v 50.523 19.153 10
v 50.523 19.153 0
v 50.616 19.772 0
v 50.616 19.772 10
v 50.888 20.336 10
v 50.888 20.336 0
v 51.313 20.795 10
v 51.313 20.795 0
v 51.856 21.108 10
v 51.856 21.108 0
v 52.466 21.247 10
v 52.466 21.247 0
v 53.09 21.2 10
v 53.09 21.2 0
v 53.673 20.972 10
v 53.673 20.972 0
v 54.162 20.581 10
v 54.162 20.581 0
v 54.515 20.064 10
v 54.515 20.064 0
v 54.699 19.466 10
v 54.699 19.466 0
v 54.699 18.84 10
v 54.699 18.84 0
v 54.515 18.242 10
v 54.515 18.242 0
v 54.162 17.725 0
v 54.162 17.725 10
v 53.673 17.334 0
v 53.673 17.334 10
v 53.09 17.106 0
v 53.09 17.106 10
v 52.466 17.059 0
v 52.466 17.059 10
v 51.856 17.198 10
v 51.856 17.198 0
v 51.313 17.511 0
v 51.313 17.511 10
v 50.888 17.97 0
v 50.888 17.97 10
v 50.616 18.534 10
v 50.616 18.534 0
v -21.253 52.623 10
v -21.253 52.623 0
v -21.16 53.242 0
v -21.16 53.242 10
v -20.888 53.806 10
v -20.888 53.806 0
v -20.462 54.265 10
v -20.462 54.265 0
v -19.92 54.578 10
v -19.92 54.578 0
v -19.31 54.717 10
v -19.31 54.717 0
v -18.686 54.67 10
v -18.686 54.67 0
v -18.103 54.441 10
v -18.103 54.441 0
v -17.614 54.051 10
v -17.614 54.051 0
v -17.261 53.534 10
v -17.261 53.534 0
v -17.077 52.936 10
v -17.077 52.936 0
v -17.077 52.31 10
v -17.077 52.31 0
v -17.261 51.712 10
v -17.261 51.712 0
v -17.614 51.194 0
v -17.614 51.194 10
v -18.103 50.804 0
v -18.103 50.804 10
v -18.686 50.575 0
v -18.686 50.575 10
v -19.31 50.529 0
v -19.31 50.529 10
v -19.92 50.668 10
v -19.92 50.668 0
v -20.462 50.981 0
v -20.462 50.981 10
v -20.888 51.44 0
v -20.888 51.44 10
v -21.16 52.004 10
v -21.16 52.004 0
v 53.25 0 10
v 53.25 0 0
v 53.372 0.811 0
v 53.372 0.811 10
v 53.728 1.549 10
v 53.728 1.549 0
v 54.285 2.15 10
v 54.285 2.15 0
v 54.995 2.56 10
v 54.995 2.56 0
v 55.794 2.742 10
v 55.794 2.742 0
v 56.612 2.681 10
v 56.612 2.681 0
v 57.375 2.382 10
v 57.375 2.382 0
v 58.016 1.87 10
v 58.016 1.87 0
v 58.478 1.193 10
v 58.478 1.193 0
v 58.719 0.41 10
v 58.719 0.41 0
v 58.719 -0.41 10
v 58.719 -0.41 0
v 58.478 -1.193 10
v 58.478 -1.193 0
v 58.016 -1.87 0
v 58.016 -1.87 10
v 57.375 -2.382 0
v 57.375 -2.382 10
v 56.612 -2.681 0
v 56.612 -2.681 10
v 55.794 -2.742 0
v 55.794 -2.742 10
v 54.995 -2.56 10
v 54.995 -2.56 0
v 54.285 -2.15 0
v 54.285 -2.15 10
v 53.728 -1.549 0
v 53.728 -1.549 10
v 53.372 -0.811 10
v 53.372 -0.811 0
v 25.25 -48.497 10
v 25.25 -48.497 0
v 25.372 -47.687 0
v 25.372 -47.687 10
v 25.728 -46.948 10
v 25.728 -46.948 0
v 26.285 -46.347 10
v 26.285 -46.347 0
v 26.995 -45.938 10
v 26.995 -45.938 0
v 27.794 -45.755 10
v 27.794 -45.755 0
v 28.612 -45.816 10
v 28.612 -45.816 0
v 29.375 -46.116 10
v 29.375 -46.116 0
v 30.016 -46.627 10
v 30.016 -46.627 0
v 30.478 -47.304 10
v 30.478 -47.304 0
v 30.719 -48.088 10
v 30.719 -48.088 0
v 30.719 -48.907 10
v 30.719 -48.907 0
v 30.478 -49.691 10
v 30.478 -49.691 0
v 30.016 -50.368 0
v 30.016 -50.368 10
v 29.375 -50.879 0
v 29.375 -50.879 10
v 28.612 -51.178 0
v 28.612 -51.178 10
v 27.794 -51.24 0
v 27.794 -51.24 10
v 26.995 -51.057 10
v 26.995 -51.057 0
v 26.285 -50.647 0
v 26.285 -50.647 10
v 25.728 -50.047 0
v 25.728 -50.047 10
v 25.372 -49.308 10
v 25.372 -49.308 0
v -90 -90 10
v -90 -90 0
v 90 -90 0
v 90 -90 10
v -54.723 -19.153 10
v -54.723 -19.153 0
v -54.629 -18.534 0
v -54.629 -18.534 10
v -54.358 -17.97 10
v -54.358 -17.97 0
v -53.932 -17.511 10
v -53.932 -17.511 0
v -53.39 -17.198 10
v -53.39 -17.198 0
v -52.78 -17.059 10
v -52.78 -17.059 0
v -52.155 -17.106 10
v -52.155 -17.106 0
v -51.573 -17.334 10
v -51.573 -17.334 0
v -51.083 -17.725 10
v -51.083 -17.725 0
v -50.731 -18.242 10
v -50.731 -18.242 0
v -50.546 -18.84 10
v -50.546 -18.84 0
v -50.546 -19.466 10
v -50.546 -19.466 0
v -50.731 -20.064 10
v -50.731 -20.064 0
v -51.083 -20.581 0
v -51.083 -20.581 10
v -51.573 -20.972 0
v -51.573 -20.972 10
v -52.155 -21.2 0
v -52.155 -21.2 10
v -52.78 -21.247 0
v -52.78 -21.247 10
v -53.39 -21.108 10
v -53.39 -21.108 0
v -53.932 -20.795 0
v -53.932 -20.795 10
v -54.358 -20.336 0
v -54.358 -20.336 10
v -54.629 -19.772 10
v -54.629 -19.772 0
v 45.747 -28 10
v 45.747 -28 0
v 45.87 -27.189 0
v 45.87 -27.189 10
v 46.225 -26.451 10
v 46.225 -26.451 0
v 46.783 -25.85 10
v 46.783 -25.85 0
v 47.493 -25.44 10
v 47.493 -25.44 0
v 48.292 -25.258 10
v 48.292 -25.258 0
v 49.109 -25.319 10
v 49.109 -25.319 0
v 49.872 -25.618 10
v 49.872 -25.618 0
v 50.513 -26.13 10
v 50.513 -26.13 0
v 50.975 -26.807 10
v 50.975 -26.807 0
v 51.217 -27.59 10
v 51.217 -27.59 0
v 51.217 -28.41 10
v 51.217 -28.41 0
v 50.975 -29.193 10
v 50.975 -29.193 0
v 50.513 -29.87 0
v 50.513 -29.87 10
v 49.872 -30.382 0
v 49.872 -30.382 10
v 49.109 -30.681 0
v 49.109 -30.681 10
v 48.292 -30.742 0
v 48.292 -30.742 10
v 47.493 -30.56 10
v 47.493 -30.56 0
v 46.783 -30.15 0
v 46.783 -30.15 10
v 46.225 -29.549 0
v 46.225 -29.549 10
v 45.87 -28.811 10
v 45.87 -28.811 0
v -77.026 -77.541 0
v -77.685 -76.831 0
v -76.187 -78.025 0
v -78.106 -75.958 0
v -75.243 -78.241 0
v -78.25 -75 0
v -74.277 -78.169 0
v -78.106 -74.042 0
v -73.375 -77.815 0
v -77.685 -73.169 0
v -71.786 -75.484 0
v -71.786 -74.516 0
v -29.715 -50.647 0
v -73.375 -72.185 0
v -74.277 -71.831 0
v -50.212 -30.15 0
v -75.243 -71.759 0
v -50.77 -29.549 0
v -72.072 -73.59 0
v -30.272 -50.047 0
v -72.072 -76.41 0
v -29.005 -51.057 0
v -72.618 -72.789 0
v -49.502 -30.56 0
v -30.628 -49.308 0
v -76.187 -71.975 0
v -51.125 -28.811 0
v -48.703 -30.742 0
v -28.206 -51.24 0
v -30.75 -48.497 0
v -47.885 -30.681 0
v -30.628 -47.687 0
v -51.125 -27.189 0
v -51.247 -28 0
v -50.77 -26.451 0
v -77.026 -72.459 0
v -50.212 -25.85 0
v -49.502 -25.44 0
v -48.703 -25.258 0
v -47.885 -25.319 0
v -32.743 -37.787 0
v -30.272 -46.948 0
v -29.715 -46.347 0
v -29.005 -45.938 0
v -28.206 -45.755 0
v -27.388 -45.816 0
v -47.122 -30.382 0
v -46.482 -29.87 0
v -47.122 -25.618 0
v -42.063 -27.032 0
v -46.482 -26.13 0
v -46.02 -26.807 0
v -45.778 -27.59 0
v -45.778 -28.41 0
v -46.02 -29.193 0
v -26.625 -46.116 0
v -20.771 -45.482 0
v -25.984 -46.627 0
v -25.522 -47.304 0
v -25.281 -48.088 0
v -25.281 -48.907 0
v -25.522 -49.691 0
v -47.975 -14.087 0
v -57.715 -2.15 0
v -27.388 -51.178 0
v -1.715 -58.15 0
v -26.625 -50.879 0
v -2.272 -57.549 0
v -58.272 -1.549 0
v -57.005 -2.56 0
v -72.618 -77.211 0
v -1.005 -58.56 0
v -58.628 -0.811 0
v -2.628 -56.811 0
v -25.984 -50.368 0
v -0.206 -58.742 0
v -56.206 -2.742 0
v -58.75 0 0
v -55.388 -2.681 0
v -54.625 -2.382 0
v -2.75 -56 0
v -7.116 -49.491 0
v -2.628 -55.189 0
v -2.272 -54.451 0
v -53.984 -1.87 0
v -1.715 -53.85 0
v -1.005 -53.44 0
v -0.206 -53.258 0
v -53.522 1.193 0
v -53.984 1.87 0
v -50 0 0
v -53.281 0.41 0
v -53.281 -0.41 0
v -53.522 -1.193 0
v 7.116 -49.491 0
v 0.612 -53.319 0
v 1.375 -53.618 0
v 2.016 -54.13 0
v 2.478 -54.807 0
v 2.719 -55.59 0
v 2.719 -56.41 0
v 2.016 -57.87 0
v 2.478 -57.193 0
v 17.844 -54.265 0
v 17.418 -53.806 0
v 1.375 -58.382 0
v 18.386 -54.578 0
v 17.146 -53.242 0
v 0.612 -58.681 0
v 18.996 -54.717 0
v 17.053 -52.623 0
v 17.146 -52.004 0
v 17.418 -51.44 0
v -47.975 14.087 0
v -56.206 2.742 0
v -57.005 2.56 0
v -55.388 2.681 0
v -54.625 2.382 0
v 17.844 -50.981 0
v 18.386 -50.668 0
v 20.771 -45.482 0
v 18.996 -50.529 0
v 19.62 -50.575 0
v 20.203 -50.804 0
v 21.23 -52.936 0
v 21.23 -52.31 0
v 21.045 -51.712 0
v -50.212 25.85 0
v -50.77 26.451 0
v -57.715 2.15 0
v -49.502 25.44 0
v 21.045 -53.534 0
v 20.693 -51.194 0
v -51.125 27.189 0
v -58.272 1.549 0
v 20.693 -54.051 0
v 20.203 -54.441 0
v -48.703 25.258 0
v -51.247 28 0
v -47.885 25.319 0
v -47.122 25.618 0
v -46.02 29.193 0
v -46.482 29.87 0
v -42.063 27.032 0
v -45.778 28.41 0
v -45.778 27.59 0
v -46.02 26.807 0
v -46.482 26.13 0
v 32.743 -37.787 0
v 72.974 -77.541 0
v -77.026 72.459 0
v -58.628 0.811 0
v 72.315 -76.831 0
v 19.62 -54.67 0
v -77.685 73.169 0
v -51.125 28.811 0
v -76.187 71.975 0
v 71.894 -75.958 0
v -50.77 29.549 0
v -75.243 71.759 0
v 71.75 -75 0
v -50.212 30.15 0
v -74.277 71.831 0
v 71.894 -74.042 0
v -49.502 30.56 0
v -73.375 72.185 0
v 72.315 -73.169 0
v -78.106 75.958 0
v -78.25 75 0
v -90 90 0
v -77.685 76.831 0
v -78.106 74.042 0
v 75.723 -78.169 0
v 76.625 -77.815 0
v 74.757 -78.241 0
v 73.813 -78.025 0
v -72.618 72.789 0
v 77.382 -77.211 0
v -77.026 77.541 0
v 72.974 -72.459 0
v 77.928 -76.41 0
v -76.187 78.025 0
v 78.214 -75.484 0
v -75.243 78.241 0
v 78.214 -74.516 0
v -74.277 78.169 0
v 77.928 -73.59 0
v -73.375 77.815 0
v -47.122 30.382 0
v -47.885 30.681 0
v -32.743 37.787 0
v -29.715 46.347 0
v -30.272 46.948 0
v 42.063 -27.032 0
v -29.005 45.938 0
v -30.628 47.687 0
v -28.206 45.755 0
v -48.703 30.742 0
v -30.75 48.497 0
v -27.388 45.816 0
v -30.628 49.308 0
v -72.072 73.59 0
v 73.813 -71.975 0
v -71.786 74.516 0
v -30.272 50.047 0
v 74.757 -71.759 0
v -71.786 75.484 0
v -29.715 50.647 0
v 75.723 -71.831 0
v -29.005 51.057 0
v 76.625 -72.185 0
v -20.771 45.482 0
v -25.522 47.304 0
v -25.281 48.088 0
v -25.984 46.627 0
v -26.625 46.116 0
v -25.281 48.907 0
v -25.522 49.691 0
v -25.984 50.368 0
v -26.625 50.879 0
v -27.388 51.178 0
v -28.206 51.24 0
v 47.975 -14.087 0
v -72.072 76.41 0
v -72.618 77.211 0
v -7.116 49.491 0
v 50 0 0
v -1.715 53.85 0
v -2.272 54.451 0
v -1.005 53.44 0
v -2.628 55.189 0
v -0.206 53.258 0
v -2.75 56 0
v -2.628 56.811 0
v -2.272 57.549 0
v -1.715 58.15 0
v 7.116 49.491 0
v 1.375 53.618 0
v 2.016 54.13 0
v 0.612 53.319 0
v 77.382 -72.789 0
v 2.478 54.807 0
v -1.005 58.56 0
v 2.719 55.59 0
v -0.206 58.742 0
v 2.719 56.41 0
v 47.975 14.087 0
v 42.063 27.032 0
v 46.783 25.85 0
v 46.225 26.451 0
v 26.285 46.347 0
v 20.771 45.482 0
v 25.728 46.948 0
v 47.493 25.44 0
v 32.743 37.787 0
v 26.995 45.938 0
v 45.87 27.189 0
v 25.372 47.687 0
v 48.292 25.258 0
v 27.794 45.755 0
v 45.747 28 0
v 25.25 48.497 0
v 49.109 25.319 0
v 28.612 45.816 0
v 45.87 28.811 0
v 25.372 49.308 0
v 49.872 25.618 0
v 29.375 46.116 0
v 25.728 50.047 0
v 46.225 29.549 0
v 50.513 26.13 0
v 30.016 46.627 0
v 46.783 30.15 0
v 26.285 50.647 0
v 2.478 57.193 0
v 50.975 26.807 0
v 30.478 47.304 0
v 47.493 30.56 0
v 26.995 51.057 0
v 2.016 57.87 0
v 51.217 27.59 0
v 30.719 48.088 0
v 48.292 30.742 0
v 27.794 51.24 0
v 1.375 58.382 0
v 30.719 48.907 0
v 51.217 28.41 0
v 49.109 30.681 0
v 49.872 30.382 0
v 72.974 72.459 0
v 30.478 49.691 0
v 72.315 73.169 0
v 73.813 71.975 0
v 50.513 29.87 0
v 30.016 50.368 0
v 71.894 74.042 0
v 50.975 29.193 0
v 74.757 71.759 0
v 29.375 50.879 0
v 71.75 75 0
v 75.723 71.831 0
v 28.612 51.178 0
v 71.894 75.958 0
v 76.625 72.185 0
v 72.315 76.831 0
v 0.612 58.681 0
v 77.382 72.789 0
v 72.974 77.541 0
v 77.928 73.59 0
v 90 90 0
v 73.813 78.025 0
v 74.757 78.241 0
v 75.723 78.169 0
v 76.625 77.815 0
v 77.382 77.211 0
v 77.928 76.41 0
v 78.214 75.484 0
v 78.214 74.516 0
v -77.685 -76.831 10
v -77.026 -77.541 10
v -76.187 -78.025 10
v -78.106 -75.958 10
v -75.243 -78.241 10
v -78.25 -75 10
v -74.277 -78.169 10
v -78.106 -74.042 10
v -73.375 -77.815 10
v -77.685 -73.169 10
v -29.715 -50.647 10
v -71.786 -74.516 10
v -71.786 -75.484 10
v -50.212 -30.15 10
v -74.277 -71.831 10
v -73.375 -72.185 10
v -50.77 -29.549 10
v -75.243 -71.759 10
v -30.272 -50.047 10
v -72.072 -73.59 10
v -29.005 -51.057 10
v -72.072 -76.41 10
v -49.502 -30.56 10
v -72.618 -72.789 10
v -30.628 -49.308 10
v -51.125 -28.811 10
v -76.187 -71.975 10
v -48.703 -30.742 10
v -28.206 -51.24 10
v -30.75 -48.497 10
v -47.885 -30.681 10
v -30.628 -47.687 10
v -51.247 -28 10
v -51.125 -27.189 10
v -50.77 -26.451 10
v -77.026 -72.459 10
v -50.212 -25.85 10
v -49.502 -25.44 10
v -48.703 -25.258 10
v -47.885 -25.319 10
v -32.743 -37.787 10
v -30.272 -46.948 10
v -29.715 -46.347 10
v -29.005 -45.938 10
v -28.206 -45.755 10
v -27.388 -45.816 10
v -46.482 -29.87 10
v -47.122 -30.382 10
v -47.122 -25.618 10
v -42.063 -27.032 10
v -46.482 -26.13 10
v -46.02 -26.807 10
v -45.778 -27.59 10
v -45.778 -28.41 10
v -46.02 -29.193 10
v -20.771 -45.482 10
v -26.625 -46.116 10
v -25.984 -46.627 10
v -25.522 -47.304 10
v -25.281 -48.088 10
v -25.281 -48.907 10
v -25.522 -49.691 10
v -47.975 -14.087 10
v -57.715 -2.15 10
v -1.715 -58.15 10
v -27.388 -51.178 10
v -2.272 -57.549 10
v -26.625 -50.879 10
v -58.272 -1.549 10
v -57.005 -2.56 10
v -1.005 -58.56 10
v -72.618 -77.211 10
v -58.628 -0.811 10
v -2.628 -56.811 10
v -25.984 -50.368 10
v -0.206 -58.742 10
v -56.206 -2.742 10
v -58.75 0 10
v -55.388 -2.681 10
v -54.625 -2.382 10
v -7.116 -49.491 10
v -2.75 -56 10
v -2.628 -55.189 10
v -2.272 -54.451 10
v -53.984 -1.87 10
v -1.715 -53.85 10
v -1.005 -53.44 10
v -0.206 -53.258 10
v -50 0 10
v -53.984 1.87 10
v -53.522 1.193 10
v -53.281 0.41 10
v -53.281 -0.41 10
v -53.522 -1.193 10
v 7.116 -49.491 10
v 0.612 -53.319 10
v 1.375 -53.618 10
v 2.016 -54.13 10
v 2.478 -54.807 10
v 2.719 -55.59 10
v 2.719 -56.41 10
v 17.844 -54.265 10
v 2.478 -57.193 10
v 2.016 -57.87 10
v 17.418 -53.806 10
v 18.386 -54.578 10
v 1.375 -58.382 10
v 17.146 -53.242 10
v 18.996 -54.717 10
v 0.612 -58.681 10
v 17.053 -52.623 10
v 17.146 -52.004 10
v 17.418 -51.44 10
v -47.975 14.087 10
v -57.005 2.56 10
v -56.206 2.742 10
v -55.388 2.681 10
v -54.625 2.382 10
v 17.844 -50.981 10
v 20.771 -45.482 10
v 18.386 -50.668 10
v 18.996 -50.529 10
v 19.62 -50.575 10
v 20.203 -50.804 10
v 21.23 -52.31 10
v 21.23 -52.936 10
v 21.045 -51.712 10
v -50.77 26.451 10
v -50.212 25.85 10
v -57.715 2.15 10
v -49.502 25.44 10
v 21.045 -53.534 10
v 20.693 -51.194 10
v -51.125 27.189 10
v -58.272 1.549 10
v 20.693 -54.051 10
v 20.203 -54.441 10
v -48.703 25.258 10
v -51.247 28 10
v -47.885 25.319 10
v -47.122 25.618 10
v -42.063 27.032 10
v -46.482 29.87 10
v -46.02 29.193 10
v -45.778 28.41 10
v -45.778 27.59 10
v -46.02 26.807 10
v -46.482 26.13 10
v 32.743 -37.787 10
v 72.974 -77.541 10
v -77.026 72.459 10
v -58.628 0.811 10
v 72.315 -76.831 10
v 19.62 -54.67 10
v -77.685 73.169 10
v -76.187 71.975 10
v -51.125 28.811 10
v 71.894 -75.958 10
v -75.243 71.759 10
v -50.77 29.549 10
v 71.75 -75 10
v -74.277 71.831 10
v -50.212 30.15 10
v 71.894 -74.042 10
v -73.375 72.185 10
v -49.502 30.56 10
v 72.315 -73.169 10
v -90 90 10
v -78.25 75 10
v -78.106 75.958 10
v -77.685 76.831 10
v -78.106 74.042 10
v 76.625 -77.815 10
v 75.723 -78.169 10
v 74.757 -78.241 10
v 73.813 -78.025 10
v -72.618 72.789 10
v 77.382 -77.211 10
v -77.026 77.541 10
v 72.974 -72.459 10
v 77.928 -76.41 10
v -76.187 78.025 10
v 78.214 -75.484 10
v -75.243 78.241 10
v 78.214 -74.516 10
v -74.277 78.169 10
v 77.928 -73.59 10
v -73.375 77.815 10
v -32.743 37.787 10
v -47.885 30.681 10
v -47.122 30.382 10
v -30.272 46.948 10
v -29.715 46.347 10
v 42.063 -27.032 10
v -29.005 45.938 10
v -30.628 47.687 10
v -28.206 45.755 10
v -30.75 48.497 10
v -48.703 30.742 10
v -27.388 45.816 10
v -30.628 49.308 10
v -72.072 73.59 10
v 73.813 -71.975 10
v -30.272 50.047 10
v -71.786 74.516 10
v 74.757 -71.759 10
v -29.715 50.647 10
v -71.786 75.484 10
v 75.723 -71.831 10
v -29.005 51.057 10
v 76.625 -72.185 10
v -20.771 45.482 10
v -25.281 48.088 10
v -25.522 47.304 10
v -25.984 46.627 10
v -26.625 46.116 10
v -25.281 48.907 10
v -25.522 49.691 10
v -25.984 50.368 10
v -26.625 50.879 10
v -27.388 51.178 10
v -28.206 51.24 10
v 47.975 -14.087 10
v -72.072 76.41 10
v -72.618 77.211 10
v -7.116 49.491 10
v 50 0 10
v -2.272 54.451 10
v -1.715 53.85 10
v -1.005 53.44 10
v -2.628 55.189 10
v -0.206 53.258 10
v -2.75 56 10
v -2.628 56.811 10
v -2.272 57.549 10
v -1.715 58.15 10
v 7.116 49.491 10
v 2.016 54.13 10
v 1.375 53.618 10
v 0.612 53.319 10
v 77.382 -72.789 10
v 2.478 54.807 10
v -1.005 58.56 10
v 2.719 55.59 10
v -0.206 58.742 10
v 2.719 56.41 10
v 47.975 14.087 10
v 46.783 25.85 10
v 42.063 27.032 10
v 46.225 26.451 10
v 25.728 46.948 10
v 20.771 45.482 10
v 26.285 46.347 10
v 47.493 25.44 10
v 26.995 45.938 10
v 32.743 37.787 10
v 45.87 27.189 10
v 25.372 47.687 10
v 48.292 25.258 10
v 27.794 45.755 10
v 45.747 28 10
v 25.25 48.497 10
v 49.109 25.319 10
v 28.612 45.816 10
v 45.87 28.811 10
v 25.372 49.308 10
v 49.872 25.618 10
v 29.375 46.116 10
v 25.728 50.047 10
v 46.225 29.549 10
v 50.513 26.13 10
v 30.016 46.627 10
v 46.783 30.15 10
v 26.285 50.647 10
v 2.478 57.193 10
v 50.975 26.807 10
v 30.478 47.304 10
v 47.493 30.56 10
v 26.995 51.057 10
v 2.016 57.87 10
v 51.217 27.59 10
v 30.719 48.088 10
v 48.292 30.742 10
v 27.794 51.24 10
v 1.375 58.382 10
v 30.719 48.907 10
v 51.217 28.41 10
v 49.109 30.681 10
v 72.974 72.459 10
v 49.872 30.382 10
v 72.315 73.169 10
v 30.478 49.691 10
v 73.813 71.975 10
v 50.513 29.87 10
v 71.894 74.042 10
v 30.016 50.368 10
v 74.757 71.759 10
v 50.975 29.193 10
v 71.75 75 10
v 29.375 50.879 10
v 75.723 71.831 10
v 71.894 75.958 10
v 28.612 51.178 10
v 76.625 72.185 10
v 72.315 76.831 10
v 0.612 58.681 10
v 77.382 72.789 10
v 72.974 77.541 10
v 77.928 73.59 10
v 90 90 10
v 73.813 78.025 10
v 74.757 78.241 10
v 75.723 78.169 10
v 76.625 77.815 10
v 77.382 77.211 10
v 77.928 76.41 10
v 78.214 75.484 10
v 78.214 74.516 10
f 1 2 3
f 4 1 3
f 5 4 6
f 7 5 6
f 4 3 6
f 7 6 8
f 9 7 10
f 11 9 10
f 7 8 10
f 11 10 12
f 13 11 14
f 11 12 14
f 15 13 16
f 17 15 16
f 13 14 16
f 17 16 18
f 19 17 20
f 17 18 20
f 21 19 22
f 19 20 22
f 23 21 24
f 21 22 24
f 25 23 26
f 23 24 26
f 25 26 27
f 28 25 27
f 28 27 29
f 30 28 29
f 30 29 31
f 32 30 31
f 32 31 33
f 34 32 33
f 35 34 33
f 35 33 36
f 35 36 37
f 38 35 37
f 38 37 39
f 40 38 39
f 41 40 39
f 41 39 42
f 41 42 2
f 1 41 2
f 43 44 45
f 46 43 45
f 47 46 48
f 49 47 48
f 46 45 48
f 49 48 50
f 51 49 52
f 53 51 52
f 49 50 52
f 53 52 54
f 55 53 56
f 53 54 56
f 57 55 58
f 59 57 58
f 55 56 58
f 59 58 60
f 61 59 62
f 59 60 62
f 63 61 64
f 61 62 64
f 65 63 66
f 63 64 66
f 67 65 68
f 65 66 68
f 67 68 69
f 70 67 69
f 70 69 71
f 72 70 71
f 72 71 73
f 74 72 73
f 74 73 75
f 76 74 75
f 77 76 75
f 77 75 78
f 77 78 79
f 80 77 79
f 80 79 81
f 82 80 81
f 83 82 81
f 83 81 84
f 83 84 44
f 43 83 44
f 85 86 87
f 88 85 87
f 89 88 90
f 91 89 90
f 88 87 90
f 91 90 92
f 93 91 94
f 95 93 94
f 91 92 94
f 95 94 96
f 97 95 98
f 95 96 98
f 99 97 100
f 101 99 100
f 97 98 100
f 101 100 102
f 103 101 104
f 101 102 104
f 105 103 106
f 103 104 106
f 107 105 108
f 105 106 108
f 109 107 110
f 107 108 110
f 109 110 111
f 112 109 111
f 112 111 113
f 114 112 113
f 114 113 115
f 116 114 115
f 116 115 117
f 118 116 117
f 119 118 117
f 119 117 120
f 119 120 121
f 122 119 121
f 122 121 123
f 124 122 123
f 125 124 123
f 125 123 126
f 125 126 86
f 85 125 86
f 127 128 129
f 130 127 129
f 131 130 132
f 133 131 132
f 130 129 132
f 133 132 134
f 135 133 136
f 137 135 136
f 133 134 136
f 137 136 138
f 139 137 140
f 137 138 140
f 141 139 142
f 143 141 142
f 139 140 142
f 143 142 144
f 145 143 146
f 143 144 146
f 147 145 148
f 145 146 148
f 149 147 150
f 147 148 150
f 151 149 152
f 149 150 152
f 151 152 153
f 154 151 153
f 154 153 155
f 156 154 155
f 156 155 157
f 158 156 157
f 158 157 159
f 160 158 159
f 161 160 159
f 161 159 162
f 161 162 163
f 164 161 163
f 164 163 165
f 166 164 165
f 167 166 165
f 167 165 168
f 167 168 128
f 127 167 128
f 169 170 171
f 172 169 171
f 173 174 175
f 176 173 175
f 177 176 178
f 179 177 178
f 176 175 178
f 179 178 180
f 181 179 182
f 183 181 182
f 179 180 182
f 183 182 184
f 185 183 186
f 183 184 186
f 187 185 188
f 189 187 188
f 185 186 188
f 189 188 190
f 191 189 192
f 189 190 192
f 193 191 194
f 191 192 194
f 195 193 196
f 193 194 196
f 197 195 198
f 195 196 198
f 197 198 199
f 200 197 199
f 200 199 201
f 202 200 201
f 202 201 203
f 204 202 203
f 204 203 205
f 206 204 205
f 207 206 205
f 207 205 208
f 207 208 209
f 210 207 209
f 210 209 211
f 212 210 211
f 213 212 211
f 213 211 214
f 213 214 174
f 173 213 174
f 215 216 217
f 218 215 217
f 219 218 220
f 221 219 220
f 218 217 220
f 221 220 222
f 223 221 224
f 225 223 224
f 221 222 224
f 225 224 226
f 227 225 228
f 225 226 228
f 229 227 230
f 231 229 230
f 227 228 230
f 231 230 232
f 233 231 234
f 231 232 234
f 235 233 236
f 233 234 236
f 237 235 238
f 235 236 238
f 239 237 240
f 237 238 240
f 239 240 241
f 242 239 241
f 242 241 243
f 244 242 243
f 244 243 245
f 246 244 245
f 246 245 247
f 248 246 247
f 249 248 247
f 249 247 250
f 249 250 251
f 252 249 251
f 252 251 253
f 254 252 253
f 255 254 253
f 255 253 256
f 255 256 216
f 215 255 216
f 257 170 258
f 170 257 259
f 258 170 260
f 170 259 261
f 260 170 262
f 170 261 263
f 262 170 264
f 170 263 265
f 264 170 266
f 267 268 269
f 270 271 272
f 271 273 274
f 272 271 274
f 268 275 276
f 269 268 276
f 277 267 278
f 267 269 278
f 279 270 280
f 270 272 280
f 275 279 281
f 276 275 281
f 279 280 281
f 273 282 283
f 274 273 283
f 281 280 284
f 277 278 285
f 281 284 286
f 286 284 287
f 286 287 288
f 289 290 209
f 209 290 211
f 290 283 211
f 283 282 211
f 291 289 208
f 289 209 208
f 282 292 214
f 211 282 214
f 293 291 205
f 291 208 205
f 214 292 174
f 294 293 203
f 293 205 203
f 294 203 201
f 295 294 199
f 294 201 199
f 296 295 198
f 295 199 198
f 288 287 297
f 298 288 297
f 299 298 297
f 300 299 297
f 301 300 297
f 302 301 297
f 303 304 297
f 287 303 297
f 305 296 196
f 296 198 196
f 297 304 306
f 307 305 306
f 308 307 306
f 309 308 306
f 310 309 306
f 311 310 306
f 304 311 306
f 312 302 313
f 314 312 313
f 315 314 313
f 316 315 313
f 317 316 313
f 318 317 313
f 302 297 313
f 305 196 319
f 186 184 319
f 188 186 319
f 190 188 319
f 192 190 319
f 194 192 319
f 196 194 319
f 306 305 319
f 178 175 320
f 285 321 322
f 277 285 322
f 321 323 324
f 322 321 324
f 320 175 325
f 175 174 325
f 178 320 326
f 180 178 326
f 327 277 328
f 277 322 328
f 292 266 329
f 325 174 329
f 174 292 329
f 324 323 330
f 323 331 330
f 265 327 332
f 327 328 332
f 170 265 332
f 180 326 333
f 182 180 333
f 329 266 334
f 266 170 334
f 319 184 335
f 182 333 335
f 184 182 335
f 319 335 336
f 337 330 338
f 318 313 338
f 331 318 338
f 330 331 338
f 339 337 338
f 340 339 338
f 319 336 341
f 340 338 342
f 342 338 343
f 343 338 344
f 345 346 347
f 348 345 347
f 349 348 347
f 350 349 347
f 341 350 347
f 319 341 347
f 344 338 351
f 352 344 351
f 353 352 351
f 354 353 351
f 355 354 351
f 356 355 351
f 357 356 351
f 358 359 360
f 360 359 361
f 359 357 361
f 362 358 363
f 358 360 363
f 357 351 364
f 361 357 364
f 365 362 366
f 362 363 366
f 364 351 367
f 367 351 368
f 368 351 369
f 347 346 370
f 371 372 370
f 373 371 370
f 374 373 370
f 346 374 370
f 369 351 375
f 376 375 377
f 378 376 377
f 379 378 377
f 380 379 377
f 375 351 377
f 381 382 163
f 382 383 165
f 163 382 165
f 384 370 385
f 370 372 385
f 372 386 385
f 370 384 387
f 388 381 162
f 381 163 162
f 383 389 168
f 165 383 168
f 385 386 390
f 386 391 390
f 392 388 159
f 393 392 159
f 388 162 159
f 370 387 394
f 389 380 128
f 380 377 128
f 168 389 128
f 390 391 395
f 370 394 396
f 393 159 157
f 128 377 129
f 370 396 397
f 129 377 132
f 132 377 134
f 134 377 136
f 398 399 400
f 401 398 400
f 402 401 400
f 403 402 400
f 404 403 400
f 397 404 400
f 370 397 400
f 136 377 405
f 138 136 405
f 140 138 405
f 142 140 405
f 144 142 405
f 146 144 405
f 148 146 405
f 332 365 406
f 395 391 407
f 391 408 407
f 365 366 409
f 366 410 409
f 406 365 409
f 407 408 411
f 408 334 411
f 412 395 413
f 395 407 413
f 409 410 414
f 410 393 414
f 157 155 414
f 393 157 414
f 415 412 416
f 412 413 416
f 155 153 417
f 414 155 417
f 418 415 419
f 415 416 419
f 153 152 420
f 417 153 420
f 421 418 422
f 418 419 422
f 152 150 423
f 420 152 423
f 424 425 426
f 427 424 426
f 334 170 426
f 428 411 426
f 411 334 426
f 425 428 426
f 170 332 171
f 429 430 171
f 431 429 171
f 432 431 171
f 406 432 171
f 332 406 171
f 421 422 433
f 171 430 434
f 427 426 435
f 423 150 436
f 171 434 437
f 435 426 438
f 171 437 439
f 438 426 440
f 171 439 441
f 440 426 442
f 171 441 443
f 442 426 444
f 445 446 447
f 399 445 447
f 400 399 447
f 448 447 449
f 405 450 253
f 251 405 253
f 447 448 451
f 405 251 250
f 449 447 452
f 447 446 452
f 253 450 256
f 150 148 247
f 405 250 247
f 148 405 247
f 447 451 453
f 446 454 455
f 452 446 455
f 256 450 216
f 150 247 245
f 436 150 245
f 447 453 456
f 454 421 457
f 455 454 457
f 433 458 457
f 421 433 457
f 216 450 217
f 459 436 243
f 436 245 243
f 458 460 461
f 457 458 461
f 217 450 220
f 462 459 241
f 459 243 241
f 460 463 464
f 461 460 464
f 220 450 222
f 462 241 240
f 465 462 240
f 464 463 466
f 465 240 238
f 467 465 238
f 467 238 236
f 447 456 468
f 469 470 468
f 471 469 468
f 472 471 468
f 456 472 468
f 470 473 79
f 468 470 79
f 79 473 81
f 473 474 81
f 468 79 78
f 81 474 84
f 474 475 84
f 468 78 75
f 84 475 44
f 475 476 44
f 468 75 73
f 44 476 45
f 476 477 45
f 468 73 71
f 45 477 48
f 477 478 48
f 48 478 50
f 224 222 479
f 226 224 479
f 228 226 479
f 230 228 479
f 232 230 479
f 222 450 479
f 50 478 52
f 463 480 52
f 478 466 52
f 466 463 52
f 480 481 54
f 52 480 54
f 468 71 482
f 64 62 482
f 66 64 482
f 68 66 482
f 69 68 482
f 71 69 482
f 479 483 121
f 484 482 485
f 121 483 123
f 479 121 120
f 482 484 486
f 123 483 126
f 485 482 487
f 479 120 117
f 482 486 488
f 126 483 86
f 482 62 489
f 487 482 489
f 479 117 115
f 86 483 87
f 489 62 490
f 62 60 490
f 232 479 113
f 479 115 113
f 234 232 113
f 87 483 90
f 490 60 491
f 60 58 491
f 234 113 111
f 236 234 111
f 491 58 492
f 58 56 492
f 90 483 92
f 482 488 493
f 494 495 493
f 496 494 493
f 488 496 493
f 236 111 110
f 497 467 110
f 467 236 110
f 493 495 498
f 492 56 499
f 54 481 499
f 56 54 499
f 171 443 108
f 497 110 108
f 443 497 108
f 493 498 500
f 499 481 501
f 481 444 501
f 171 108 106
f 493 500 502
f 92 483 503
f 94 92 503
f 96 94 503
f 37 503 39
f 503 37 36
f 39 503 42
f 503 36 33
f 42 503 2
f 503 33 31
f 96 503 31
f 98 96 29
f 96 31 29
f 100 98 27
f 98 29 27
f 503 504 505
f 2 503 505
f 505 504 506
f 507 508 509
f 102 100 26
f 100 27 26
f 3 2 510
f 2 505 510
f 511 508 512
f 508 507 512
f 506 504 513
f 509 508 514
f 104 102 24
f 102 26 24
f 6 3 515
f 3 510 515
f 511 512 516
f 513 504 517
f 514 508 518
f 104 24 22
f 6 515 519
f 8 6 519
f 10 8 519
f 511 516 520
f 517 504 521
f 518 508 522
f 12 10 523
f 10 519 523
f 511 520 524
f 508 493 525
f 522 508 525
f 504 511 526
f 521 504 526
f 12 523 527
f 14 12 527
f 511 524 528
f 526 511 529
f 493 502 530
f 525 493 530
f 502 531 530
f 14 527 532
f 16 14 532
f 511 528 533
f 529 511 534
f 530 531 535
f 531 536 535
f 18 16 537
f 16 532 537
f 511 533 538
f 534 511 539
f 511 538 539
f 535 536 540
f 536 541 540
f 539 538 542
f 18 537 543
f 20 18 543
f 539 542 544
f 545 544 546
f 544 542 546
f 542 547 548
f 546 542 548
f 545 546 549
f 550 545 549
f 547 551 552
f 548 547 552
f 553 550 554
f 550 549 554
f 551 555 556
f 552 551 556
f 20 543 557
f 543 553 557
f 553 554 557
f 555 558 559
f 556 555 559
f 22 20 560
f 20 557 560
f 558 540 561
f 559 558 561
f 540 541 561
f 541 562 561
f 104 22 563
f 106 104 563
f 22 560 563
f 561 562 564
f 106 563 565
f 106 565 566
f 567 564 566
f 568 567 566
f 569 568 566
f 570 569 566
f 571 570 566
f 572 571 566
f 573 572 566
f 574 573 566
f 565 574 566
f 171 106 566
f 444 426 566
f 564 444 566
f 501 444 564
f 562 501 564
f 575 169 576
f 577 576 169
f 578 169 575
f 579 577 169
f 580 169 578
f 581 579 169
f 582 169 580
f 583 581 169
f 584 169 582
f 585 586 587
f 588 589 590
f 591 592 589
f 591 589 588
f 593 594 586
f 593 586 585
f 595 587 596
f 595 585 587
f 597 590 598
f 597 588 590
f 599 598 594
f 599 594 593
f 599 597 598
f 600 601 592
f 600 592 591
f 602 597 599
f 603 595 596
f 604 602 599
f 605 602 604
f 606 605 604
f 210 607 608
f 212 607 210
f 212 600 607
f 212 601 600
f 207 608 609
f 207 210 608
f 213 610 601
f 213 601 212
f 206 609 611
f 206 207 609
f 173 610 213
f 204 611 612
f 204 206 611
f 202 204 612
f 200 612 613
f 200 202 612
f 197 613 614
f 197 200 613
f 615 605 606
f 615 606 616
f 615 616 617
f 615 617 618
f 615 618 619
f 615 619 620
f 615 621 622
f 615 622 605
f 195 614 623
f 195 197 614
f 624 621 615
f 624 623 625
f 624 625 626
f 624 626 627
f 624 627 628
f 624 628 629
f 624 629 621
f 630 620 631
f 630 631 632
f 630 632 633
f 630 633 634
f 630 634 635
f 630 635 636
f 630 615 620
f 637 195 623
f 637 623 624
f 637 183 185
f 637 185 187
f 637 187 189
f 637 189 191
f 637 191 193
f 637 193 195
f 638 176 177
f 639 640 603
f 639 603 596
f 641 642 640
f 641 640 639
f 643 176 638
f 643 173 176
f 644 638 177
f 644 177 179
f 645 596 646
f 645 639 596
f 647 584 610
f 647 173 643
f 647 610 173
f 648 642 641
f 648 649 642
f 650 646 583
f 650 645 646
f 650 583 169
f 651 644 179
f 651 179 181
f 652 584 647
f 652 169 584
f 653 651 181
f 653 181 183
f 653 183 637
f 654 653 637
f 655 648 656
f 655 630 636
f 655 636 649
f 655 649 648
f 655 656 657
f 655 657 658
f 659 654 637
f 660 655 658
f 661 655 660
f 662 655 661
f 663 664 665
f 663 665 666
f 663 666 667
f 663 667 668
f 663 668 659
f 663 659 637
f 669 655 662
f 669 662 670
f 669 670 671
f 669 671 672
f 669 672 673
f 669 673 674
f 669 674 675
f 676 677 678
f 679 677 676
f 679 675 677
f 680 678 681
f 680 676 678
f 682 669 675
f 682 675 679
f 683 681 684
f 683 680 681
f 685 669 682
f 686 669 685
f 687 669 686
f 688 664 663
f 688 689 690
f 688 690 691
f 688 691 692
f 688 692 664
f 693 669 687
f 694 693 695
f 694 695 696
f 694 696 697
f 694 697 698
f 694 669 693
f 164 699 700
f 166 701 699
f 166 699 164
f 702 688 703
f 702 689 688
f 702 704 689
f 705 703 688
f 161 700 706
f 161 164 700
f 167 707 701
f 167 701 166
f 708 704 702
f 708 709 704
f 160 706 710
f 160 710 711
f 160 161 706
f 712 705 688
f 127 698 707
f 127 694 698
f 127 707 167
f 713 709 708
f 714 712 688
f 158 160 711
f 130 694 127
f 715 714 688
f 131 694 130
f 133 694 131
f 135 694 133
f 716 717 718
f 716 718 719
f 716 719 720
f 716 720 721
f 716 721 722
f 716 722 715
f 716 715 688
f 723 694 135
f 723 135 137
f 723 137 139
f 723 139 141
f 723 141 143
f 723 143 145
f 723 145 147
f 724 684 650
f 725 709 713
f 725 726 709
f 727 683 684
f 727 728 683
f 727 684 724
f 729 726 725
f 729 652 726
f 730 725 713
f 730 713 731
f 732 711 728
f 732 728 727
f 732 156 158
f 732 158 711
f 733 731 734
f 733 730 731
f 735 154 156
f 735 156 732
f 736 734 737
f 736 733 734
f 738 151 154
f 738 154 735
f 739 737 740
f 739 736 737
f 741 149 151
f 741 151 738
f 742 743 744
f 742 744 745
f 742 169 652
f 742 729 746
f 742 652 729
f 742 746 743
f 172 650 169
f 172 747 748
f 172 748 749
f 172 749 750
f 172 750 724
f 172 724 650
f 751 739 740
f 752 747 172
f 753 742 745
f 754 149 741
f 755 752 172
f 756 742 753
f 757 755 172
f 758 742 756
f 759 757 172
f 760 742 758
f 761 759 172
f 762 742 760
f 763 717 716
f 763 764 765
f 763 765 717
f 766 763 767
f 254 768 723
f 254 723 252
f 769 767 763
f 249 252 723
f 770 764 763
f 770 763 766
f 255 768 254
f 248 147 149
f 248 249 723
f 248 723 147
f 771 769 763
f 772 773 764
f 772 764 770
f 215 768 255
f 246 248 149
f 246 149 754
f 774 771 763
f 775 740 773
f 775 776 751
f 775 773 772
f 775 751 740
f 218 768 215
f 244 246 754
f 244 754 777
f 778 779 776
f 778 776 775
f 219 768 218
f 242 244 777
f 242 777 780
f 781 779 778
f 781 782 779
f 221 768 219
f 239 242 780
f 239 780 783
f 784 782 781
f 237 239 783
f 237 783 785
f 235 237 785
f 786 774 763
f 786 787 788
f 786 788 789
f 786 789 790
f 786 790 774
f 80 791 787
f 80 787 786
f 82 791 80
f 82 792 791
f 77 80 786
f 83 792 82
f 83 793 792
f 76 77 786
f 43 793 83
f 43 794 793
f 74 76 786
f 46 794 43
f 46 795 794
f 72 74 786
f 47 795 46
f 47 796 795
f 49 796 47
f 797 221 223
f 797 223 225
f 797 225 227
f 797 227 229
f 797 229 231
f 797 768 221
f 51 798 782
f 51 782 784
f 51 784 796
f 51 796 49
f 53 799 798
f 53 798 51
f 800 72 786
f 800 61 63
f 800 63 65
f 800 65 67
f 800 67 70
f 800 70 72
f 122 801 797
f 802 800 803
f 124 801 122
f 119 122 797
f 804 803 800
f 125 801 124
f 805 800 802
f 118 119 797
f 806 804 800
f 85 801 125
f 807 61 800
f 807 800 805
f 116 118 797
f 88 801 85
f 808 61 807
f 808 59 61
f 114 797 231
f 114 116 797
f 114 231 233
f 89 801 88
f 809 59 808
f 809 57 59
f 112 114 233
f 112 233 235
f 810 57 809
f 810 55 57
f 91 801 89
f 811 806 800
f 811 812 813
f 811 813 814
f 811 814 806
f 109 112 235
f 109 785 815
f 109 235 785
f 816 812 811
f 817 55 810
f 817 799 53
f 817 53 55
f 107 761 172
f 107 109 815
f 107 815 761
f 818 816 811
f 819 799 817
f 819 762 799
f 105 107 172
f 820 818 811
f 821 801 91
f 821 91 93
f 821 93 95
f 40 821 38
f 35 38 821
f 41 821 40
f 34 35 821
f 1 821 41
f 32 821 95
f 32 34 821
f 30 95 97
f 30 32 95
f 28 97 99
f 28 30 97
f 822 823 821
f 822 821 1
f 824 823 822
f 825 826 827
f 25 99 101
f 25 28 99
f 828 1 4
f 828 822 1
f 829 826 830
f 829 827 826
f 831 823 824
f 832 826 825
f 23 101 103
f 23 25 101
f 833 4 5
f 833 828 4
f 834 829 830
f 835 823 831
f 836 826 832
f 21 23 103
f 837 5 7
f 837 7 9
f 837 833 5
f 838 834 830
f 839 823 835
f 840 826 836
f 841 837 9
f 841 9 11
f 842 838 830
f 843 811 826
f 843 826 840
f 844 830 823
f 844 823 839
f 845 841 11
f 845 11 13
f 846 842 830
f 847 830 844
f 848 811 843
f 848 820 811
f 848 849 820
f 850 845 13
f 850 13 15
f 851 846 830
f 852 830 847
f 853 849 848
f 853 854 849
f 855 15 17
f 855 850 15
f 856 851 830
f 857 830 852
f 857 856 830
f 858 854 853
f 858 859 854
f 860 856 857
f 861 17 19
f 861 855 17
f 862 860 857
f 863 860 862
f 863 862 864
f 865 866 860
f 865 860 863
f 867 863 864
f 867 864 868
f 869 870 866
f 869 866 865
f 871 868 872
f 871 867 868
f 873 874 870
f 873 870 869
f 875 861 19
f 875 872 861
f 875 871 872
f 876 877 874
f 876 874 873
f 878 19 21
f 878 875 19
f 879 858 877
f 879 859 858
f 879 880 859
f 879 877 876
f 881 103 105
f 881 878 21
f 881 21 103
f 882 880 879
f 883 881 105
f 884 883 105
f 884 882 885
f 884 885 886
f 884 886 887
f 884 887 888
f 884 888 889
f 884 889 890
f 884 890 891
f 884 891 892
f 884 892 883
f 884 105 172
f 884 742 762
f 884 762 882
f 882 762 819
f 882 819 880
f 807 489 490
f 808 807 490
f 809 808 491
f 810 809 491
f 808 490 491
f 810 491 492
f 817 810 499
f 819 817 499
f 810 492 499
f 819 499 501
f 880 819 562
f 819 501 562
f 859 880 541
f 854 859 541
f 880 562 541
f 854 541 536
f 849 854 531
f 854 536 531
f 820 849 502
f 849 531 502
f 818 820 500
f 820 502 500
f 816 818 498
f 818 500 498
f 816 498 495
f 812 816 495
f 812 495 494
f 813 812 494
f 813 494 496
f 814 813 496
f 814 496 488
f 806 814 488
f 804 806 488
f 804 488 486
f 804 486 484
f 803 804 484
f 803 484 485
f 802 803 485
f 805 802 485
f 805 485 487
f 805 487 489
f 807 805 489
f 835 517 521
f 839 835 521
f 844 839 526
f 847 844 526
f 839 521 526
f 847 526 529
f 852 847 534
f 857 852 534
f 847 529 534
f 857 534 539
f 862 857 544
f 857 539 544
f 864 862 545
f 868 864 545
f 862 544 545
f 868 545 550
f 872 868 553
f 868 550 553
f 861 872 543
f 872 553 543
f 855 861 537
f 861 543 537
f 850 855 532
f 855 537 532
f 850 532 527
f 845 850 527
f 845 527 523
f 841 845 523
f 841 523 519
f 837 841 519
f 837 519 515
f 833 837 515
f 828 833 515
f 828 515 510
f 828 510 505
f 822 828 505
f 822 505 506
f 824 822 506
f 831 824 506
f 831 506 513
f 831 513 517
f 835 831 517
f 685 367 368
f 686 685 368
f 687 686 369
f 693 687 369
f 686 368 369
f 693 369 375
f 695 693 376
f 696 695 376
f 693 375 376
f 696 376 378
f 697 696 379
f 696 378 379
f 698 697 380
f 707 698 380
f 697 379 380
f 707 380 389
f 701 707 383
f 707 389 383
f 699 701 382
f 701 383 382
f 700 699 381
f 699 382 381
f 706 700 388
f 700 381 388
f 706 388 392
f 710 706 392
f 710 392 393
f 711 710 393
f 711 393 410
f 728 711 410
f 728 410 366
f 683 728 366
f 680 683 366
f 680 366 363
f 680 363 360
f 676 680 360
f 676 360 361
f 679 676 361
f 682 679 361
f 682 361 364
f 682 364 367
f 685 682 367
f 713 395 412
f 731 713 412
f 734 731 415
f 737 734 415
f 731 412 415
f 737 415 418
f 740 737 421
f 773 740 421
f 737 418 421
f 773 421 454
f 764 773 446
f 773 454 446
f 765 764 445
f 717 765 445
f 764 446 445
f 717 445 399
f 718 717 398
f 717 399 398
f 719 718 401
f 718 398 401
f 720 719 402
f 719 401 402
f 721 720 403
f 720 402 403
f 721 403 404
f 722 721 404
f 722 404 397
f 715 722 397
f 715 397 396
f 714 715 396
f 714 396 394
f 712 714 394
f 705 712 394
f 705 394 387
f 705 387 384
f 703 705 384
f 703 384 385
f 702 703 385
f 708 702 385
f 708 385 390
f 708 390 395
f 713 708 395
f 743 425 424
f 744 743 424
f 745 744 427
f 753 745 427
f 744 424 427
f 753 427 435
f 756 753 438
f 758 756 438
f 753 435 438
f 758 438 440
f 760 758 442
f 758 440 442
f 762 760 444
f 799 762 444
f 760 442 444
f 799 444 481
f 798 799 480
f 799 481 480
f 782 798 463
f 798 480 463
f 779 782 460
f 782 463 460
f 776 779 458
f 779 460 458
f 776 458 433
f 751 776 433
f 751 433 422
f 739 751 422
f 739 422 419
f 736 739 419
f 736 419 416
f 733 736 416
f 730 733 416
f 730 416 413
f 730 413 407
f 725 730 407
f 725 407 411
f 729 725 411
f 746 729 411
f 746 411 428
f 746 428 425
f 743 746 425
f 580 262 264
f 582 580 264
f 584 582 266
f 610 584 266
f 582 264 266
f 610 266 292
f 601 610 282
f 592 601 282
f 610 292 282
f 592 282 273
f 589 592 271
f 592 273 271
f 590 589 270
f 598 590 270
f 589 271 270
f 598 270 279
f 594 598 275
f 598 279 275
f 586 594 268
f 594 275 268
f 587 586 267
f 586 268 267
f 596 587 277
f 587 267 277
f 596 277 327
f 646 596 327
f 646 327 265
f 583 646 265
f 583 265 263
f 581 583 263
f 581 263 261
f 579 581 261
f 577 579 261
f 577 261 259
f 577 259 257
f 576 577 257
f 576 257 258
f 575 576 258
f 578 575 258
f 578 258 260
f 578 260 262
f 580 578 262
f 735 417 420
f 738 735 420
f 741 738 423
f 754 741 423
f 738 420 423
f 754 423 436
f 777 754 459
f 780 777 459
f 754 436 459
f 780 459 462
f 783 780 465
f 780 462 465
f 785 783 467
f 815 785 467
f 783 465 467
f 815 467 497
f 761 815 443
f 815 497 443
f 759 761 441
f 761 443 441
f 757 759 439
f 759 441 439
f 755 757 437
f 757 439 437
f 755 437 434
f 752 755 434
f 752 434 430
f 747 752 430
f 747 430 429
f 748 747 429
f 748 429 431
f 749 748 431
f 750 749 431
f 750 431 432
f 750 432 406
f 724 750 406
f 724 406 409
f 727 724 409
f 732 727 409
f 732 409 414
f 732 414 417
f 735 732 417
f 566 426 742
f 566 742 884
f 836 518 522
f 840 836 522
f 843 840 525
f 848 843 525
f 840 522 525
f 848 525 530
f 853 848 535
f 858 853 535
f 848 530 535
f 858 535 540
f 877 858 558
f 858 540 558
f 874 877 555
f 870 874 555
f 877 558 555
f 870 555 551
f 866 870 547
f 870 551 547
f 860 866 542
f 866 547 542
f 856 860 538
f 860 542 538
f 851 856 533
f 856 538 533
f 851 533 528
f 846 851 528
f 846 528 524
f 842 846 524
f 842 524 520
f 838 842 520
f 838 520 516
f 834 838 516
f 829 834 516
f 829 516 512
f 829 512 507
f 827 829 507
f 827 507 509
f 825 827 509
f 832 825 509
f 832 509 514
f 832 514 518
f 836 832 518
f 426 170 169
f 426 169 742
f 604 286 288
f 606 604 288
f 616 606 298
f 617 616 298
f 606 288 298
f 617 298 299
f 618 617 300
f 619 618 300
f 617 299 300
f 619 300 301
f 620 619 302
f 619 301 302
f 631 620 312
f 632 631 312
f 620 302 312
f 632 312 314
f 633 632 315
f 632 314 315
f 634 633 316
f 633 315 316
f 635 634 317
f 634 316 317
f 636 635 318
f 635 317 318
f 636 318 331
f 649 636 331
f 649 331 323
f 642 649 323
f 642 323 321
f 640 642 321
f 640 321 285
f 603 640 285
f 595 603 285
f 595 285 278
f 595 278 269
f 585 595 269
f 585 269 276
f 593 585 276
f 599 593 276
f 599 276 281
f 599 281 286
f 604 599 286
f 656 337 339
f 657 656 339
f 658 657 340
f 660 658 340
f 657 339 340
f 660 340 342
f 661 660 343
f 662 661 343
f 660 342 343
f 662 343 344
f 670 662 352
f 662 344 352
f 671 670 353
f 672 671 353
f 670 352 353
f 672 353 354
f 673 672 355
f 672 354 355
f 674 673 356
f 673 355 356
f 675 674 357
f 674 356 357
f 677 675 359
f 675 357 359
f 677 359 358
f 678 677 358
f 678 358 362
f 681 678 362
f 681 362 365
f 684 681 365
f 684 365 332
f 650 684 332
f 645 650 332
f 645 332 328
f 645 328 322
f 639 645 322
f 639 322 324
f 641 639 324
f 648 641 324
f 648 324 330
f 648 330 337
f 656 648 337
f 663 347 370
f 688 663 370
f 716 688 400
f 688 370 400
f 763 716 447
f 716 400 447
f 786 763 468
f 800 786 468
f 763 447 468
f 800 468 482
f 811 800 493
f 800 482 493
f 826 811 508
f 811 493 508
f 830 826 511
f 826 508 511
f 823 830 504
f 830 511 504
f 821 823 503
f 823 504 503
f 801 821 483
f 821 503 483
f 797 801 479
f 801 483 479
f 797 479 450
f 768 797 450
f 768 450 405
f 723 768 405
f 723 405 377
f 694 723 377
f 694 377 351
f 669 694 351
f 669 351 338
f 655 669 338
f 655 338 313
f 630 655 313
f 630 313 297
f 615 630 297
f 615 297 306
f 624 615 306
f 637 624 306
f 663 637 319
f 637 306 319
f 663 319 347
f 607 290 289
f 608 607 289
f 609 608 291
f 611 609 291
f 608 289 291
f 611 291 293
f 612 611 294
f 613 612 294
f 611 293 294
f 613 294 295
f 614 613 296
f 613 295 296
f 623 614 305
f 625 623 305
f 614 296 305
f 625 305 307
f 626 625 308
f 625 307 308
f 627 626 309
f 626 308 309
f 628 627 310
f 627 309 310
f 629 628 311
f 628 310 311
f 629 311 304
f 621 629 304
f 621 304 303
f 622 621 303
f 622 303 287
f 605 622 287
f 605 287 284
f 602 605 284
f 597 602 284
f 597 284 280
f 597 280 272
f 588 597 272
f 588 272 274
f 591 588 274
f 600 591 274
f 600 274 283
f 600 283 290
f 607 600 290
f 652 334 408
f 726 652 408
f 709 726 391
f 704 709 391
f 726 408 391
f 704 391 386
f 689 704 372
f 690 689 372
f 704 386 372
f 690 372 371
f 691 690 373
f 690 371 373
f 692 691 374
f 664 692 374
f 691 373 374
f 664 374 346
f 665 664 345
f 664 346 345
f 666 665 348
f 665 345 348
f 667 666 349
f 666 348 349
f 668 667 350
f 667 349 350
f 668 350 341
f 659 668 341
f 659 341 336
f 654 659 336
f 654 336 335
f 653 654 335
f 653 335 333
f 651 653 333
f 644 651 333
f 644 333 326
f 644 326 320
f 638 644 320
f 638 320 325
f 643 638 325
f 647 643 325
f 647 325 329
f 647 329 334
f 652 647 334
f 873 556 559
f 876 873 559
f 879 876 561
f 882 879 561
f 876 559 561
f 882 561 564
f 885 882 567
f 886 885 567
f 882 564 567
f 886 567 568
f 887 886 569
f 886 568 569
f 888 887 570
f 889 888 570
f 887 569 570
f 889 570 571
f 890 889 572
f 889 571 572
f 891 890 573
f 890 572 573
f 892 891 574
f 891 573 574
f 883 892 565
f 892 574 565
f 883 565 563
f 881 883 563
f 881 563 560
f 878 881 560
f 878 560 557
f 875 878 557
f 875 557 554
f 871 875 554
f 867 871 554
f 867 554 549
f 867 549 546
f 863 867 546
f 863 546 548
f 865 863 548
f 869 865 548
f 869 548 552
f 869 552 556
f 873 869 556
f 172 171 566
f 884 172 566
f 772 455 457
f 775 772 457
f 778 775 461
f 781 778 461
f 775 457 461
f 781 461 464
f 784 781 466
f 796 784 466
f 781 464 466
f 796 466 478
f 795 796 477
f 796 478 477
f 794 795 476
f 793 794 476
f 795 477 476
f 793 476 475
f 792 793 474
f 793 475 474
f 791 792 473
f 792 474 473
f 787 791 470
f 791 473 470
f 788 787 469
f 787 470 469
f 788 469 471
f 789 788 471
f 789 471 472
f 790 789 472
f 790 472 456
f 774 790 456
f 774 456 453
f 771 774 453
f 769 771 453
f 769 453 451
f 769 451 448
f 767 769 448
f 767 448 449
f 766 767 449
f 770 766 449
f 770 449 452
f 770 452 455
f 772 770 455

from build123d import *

# Parameters (mm, degrees)
SKETCH_1_W          = 180
SKETCH_1_H          = 180
EXTRUDE_1_DEPTH     = 10
SKETCH_2_R          = 50
SKETCH_2_R_2        = 2.75
SKETCH_2_R_3        = 2.1
SKETCH_2_R_4        = 3.25
CUT_EXTRUDE_1_DEPTH = 11


with BuildPart() as part:
    # 草图1 → 凸台-拉伸1 (new body)
    with BuildSketch(Plane.XY):
        Rectangle(SKETCH_1_W, SKETCH_1_H)
    extrude(amount=EXTRUDE_1_DEPTH)

    # 草图2 → 切除-拉伸1 (cut)
    with BuildSketch(Plane(origin=(0, 0, 0), x_dir=(-1, 0, 0), z_dir=(0, 0, -1))):
        Circle(SKETCH_2_R)
        with Locations((-56, 0)):
            Circle(SKETCH_2_R_2)
        with Locations((-48.497422612, 28)):
            Circle(SKETCH_2_R_2)
        with Locations((-28, 48.497422612)):
            Circle(SKETCH_2_R_2)
        with Locations((0, 56)):
            Circle(SKETCH_2_R_2)
        with Locations((28, 48.497422612)):
            Circle(SKETCH_2_R_2)
        with Locations((48.497422612, 28)):
            Circle(SKETCH_2_R_2)
        with Locations((56, 0)):
            Circle(SKETCH_2_R_2)
        with Locations((48.497422612, -28)):
            Circle(SKETCH_2_R_2)
        with Locations((28, -48.497422612)):
            Circle(SKETCH_2_R_2)
        with Locations((0, -56)):
            Circle(SKETCH_2_R_2)
        with Locations((-28, -48.497422612)):
            Circle(SKETCH_2_R_2)
        with Locations((-48.497422612, -28)):
            Circle(SKETCH_2_R_2)
        with Locations((-52.622786764, 19.153128026)):
            Circle(SKETCH_2_R_3)
        with Locations((19.153128026, 52.622786764)):
            Circle(SKETCH_2_R_3)
        with Locations((52.622786764, -19.153128026)):
            Circle(SKETCH_2_R_3)
        with Locations((-19.153128026, -52.622786764)):
            Circle(SKETCH_2_R_3)
        with Locations((75, -75)):
            Circle(SKETCH_2_R_4)
        with Locations((75, 75)):
            Circle(SKETCH_2_R_4)
        with Locations((-75, -75)):
            Circle(SKETCH_2_R_4)
        with Locations((-75, 75)):
            Circle(SKETCH_2_R_4)
    extrude(amount=-CUT_EXTRUDE_1_DEPTH, mode=Mode.SUBTRACT)


solid = part.part
